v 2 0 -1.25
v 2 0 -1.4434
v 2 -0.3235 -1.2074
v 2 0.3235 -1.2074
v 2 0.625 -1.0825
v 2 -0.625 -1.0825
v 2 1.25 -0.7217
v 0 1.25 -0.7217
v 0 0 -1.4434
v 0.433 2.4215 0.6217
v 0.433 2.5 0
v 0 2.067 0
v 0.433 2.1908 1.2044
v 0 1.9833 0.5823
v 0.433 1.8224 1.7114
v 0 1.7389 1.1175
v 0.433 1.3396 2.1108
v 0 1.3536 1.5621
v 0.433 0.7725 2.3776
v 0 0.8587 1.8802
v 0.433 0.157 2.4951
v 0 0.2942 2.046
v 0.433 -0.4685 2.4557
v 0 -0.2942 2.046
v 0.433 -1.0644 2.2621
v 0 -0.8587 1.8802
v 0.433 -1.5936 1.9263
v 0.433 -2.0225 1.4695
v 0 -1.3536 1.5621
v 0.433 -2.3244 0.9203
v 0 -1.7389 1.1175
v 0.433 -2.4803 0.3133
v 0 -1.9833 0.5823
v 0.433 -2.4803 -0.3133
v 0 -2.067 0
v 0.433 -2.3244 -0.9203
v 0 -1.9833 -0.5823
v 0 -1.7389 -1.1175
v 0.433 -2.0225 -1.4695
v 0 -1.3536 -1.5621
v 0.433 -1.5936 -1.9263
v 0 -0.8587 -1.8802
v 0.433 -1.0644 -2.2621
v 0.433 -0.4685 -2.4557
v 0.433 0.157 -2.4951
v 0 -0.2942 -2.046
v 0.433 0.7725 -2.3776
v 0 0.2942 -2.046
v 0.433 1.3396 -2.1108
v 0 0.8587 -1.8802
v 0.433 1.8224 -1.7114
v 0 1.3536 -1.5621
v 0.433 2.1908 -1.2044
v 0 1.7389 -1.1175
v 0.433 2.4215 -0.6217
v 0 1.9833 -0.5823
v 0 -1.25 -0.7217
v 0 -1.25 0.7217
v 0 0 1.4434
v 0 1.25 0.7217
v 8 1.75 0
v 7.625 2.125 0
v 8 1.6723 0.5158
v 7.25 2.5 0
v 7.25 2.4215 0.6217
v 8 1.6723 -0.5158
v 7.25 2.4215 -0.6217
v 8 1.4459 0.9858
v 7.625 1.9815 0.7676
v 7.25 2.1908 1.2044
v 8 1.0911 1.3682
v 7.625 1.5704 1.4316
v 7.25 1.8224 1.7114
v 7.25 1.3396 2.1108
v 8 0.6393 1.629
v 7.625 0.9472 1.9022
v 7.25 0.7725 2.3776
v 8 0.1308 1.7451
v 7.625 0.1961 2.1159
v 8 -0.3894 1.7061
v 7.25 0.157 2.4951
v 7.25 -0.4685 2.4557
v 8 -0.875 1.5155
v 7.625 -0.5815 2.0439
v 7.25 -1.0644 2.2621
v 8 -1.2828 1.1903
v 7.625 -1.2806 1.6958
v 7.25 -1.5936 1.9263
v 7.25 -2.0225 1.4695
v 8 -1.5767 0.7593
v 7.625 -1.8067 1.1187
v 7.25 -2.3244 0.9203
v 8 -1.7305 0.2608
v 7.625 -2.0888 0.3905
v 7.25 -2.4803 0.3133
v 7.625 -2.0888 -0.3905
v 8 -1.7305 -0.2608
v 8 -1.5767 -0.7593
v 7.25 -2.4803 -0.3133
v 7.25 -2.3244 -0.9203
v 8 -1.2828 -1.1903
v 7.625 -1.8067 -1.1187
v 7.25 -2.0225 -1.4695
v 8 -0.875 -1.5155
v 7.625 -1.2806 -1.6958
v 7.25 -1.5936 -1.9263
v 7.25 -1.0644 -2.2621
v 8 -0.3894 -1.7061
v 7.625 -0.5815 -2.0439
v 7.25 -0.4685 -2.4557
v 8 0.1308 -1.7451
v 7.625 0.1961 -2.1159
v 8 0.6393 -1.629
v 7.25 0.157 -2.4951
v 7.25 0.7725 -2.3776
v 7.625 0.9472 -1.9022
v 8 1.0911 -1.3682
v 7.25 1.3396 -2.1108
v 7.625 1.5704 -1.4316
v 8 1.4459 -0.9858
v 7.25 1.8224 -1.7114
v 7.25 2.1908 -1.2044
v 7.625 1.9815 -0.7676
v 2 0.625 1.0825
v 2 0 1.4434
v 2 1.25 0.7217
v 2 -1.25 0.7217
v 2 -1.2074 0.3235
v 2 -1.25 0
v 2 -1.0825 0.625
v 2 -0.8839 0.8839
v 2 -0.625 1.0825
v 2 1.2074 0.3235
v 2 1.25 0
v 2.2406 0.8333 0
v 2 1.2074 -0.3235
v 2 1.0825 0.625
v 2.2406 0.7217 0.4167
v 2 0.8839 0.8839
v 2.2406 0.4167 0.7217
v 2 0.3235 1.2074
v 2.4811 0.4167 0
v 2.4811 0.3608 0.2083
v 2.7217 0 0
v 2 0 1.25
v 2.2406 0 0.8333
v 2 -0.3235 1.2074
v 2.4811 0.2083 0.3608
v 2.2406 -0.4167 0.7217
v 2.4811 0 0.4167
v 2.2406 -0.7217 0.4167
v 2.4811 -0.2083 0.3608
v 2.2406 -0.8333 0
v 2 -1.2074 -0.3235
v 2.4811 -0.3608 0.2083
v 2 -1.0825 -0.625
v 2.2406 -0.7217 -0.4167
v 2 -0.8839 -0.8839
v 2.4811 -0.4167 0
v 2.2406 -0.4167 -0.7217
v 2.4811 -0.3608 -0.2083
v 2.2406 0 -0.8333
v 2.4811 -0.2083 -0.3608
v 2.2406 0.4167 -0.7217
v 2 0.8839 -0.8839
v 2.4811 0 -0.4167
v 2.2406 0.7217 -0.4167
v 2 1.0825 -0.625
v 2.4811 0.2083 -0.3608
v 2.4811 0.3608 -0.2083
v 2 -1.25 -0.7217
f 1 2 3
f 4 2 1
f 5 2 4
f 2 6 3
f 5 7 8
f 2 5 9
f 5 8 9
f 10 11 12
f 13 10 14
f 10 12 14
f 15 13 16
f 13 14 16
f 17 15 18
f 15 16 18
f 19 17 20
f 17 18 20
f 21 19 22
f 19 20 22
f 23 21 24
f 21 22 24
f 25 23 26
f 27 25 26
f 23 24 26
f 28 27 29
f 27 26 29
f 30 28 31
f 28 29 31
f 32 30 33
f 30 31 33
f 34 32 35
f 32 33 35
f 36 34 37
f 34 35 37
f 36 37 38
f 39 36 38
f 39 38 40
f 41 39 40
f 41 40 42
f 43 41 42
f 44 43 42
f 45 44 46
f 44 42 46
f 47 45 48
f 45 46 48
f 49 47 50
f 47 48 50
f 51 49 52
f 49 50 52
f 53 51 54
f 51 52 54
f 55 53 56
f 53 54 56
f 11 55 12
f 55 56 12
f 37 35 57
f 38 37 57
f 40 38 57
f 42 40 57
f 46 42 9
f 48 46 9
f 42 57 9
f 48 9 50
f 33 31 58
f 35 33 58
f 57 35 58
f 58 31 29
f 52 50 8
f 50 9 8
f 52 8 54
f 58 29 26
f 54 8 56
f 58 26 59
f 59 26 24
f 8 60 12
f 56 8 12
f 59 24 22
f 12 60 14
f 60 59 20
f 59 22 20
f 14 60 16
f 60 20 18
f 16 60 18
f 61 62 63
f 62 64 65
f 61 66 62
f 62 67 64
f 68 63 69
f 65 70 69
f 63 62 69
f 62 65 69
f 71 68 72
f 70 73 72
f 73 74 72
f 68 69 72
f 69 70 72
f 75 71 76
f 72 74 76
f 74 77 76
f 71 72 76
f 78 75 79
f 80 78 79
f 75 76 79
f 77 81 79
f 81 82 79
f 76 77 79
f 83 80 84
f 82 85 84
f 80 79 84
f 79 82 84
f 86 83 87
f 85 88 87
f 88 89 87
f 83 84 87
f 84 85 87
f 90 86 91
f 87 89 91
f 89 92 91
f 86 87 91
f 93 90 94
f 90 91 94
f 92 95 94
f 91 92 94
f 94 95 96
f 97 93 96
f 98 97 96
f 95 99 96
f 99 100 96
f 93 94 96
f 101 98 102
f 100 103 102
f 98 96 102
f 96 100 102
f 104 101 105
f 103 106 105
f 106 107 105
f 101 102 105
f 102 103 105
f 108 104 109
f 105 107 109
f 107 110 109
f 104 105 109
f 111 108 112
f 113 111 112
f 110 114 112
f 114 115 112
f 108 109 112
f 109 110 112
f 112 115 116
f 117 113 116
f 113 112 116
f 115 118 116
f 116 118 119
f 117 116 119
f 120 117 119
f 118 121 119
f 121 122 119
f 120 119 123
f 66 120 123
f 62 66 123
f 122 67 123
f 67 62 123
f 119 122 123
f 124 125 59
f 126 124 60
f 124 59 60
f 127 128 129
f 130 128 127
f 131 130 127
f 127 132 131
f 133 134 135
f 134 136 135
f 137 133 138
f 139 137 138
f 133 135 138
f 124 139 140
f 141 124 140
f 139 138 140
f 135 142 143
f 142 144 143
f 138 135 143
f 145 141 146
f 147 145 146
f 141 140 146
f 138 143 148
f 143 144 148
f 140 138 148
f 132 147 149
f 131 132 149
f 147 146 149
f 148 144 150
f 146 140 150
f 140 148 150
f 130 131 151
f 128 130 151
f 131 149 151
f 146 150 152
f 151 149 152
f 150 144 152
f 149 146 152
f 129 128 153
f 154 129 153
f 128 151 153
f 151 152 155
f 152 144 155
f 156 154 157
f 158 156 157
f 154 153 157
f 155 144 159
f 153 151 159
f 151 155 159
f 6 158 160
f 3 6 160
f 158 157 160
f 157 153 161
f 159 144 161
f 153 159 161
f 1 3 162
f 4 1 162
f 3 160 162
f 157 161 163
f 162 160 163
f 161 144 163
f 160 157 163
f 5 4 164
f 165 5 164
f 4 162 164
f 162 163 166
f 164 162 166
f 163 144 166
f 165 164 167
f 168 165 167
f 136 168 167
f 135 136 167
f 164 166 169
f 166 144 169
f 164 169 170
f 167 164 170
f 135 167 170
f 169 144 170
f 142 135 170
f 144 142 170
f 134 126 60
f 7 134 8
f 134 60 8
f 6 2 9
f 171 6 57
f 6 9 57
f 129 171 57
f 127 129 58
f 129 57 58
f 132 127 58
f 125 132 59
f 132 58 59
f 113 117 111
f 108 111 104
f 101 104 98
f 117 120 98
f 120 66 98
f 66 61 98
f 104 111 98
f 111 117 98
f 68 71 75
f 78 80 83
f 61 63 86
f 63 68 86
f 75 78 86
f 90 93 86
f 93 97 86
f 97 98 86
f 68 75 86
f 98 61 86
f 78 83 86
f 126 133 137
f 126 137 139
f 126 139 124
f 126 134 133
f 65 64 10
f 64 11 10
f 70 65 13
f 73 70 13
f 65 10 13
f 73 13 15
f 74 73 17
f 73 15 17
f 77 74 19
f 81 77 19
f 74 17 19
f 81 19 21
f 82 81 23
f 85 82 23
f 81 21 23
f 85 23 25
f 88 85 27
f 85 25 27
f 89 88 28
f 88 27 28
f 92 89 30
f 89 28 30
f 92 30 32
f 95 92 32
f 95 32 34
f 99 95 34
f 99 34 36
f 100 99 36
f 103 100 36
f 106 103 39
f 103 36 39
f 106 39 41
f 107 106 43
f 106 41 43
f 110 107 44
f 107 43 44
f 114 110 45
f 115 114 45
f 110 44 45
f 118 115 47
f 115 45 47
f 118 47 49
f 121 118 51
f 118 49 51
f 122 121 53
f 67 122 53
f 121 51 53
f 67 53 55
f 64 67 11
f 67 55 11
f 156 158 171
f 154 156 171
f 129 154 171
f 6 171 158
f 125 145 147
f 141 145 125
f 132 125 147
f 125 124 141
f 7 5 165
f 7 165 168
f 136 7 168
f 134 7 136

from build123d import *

# Parameters (mm, degrees)
HEXAGONSOCKET_DEPTH = 2


with BuildPart() as part:
    # Sketch1 → Base (revolve)
    with BuildSketch(Plane.XY):
        Polygon((0, 0), (8, 0), (8, 1.75), (7.25, 2.5), (0.433, 2.5), (0, 2.067), align=None)
    revolve(axis=Axis((-10.745014543, 0, 0), (1, 0, 0)))

    # Sketch2 → HexagonSocket (cut)
    with BuildSketch(Plane(origin=(0, -0.021932325, 0.010138848), x_dir=(0, 0, 1), z_dir=(-1, 0, 0))):
        Polygon((1.433236825, 0.021932325), (0.711548988, 1.271932325), (-0.731826685, 1.271932325), (-1.453514521, 0.021932325), (-0.731826685, -1.228067675), (0.711548988, -1.228067675), align=None)
    extrude(amount=-HEXAGONSOCKET_DEPTH, mode=Mode.SUBTRACT)

    # Sketch3 → Cut-Revolve1 (revolve, cut)
    with BuildSketch(Plane.XY):
        Polygon((2, 1.25), (2.721687837, 0), (2, 0), align=None)
    revolve(axis=Axis((-3.144113667, 0, 0), (1, 0, 0)), mode=Mode.SUBTRACT)


solid = part.part
